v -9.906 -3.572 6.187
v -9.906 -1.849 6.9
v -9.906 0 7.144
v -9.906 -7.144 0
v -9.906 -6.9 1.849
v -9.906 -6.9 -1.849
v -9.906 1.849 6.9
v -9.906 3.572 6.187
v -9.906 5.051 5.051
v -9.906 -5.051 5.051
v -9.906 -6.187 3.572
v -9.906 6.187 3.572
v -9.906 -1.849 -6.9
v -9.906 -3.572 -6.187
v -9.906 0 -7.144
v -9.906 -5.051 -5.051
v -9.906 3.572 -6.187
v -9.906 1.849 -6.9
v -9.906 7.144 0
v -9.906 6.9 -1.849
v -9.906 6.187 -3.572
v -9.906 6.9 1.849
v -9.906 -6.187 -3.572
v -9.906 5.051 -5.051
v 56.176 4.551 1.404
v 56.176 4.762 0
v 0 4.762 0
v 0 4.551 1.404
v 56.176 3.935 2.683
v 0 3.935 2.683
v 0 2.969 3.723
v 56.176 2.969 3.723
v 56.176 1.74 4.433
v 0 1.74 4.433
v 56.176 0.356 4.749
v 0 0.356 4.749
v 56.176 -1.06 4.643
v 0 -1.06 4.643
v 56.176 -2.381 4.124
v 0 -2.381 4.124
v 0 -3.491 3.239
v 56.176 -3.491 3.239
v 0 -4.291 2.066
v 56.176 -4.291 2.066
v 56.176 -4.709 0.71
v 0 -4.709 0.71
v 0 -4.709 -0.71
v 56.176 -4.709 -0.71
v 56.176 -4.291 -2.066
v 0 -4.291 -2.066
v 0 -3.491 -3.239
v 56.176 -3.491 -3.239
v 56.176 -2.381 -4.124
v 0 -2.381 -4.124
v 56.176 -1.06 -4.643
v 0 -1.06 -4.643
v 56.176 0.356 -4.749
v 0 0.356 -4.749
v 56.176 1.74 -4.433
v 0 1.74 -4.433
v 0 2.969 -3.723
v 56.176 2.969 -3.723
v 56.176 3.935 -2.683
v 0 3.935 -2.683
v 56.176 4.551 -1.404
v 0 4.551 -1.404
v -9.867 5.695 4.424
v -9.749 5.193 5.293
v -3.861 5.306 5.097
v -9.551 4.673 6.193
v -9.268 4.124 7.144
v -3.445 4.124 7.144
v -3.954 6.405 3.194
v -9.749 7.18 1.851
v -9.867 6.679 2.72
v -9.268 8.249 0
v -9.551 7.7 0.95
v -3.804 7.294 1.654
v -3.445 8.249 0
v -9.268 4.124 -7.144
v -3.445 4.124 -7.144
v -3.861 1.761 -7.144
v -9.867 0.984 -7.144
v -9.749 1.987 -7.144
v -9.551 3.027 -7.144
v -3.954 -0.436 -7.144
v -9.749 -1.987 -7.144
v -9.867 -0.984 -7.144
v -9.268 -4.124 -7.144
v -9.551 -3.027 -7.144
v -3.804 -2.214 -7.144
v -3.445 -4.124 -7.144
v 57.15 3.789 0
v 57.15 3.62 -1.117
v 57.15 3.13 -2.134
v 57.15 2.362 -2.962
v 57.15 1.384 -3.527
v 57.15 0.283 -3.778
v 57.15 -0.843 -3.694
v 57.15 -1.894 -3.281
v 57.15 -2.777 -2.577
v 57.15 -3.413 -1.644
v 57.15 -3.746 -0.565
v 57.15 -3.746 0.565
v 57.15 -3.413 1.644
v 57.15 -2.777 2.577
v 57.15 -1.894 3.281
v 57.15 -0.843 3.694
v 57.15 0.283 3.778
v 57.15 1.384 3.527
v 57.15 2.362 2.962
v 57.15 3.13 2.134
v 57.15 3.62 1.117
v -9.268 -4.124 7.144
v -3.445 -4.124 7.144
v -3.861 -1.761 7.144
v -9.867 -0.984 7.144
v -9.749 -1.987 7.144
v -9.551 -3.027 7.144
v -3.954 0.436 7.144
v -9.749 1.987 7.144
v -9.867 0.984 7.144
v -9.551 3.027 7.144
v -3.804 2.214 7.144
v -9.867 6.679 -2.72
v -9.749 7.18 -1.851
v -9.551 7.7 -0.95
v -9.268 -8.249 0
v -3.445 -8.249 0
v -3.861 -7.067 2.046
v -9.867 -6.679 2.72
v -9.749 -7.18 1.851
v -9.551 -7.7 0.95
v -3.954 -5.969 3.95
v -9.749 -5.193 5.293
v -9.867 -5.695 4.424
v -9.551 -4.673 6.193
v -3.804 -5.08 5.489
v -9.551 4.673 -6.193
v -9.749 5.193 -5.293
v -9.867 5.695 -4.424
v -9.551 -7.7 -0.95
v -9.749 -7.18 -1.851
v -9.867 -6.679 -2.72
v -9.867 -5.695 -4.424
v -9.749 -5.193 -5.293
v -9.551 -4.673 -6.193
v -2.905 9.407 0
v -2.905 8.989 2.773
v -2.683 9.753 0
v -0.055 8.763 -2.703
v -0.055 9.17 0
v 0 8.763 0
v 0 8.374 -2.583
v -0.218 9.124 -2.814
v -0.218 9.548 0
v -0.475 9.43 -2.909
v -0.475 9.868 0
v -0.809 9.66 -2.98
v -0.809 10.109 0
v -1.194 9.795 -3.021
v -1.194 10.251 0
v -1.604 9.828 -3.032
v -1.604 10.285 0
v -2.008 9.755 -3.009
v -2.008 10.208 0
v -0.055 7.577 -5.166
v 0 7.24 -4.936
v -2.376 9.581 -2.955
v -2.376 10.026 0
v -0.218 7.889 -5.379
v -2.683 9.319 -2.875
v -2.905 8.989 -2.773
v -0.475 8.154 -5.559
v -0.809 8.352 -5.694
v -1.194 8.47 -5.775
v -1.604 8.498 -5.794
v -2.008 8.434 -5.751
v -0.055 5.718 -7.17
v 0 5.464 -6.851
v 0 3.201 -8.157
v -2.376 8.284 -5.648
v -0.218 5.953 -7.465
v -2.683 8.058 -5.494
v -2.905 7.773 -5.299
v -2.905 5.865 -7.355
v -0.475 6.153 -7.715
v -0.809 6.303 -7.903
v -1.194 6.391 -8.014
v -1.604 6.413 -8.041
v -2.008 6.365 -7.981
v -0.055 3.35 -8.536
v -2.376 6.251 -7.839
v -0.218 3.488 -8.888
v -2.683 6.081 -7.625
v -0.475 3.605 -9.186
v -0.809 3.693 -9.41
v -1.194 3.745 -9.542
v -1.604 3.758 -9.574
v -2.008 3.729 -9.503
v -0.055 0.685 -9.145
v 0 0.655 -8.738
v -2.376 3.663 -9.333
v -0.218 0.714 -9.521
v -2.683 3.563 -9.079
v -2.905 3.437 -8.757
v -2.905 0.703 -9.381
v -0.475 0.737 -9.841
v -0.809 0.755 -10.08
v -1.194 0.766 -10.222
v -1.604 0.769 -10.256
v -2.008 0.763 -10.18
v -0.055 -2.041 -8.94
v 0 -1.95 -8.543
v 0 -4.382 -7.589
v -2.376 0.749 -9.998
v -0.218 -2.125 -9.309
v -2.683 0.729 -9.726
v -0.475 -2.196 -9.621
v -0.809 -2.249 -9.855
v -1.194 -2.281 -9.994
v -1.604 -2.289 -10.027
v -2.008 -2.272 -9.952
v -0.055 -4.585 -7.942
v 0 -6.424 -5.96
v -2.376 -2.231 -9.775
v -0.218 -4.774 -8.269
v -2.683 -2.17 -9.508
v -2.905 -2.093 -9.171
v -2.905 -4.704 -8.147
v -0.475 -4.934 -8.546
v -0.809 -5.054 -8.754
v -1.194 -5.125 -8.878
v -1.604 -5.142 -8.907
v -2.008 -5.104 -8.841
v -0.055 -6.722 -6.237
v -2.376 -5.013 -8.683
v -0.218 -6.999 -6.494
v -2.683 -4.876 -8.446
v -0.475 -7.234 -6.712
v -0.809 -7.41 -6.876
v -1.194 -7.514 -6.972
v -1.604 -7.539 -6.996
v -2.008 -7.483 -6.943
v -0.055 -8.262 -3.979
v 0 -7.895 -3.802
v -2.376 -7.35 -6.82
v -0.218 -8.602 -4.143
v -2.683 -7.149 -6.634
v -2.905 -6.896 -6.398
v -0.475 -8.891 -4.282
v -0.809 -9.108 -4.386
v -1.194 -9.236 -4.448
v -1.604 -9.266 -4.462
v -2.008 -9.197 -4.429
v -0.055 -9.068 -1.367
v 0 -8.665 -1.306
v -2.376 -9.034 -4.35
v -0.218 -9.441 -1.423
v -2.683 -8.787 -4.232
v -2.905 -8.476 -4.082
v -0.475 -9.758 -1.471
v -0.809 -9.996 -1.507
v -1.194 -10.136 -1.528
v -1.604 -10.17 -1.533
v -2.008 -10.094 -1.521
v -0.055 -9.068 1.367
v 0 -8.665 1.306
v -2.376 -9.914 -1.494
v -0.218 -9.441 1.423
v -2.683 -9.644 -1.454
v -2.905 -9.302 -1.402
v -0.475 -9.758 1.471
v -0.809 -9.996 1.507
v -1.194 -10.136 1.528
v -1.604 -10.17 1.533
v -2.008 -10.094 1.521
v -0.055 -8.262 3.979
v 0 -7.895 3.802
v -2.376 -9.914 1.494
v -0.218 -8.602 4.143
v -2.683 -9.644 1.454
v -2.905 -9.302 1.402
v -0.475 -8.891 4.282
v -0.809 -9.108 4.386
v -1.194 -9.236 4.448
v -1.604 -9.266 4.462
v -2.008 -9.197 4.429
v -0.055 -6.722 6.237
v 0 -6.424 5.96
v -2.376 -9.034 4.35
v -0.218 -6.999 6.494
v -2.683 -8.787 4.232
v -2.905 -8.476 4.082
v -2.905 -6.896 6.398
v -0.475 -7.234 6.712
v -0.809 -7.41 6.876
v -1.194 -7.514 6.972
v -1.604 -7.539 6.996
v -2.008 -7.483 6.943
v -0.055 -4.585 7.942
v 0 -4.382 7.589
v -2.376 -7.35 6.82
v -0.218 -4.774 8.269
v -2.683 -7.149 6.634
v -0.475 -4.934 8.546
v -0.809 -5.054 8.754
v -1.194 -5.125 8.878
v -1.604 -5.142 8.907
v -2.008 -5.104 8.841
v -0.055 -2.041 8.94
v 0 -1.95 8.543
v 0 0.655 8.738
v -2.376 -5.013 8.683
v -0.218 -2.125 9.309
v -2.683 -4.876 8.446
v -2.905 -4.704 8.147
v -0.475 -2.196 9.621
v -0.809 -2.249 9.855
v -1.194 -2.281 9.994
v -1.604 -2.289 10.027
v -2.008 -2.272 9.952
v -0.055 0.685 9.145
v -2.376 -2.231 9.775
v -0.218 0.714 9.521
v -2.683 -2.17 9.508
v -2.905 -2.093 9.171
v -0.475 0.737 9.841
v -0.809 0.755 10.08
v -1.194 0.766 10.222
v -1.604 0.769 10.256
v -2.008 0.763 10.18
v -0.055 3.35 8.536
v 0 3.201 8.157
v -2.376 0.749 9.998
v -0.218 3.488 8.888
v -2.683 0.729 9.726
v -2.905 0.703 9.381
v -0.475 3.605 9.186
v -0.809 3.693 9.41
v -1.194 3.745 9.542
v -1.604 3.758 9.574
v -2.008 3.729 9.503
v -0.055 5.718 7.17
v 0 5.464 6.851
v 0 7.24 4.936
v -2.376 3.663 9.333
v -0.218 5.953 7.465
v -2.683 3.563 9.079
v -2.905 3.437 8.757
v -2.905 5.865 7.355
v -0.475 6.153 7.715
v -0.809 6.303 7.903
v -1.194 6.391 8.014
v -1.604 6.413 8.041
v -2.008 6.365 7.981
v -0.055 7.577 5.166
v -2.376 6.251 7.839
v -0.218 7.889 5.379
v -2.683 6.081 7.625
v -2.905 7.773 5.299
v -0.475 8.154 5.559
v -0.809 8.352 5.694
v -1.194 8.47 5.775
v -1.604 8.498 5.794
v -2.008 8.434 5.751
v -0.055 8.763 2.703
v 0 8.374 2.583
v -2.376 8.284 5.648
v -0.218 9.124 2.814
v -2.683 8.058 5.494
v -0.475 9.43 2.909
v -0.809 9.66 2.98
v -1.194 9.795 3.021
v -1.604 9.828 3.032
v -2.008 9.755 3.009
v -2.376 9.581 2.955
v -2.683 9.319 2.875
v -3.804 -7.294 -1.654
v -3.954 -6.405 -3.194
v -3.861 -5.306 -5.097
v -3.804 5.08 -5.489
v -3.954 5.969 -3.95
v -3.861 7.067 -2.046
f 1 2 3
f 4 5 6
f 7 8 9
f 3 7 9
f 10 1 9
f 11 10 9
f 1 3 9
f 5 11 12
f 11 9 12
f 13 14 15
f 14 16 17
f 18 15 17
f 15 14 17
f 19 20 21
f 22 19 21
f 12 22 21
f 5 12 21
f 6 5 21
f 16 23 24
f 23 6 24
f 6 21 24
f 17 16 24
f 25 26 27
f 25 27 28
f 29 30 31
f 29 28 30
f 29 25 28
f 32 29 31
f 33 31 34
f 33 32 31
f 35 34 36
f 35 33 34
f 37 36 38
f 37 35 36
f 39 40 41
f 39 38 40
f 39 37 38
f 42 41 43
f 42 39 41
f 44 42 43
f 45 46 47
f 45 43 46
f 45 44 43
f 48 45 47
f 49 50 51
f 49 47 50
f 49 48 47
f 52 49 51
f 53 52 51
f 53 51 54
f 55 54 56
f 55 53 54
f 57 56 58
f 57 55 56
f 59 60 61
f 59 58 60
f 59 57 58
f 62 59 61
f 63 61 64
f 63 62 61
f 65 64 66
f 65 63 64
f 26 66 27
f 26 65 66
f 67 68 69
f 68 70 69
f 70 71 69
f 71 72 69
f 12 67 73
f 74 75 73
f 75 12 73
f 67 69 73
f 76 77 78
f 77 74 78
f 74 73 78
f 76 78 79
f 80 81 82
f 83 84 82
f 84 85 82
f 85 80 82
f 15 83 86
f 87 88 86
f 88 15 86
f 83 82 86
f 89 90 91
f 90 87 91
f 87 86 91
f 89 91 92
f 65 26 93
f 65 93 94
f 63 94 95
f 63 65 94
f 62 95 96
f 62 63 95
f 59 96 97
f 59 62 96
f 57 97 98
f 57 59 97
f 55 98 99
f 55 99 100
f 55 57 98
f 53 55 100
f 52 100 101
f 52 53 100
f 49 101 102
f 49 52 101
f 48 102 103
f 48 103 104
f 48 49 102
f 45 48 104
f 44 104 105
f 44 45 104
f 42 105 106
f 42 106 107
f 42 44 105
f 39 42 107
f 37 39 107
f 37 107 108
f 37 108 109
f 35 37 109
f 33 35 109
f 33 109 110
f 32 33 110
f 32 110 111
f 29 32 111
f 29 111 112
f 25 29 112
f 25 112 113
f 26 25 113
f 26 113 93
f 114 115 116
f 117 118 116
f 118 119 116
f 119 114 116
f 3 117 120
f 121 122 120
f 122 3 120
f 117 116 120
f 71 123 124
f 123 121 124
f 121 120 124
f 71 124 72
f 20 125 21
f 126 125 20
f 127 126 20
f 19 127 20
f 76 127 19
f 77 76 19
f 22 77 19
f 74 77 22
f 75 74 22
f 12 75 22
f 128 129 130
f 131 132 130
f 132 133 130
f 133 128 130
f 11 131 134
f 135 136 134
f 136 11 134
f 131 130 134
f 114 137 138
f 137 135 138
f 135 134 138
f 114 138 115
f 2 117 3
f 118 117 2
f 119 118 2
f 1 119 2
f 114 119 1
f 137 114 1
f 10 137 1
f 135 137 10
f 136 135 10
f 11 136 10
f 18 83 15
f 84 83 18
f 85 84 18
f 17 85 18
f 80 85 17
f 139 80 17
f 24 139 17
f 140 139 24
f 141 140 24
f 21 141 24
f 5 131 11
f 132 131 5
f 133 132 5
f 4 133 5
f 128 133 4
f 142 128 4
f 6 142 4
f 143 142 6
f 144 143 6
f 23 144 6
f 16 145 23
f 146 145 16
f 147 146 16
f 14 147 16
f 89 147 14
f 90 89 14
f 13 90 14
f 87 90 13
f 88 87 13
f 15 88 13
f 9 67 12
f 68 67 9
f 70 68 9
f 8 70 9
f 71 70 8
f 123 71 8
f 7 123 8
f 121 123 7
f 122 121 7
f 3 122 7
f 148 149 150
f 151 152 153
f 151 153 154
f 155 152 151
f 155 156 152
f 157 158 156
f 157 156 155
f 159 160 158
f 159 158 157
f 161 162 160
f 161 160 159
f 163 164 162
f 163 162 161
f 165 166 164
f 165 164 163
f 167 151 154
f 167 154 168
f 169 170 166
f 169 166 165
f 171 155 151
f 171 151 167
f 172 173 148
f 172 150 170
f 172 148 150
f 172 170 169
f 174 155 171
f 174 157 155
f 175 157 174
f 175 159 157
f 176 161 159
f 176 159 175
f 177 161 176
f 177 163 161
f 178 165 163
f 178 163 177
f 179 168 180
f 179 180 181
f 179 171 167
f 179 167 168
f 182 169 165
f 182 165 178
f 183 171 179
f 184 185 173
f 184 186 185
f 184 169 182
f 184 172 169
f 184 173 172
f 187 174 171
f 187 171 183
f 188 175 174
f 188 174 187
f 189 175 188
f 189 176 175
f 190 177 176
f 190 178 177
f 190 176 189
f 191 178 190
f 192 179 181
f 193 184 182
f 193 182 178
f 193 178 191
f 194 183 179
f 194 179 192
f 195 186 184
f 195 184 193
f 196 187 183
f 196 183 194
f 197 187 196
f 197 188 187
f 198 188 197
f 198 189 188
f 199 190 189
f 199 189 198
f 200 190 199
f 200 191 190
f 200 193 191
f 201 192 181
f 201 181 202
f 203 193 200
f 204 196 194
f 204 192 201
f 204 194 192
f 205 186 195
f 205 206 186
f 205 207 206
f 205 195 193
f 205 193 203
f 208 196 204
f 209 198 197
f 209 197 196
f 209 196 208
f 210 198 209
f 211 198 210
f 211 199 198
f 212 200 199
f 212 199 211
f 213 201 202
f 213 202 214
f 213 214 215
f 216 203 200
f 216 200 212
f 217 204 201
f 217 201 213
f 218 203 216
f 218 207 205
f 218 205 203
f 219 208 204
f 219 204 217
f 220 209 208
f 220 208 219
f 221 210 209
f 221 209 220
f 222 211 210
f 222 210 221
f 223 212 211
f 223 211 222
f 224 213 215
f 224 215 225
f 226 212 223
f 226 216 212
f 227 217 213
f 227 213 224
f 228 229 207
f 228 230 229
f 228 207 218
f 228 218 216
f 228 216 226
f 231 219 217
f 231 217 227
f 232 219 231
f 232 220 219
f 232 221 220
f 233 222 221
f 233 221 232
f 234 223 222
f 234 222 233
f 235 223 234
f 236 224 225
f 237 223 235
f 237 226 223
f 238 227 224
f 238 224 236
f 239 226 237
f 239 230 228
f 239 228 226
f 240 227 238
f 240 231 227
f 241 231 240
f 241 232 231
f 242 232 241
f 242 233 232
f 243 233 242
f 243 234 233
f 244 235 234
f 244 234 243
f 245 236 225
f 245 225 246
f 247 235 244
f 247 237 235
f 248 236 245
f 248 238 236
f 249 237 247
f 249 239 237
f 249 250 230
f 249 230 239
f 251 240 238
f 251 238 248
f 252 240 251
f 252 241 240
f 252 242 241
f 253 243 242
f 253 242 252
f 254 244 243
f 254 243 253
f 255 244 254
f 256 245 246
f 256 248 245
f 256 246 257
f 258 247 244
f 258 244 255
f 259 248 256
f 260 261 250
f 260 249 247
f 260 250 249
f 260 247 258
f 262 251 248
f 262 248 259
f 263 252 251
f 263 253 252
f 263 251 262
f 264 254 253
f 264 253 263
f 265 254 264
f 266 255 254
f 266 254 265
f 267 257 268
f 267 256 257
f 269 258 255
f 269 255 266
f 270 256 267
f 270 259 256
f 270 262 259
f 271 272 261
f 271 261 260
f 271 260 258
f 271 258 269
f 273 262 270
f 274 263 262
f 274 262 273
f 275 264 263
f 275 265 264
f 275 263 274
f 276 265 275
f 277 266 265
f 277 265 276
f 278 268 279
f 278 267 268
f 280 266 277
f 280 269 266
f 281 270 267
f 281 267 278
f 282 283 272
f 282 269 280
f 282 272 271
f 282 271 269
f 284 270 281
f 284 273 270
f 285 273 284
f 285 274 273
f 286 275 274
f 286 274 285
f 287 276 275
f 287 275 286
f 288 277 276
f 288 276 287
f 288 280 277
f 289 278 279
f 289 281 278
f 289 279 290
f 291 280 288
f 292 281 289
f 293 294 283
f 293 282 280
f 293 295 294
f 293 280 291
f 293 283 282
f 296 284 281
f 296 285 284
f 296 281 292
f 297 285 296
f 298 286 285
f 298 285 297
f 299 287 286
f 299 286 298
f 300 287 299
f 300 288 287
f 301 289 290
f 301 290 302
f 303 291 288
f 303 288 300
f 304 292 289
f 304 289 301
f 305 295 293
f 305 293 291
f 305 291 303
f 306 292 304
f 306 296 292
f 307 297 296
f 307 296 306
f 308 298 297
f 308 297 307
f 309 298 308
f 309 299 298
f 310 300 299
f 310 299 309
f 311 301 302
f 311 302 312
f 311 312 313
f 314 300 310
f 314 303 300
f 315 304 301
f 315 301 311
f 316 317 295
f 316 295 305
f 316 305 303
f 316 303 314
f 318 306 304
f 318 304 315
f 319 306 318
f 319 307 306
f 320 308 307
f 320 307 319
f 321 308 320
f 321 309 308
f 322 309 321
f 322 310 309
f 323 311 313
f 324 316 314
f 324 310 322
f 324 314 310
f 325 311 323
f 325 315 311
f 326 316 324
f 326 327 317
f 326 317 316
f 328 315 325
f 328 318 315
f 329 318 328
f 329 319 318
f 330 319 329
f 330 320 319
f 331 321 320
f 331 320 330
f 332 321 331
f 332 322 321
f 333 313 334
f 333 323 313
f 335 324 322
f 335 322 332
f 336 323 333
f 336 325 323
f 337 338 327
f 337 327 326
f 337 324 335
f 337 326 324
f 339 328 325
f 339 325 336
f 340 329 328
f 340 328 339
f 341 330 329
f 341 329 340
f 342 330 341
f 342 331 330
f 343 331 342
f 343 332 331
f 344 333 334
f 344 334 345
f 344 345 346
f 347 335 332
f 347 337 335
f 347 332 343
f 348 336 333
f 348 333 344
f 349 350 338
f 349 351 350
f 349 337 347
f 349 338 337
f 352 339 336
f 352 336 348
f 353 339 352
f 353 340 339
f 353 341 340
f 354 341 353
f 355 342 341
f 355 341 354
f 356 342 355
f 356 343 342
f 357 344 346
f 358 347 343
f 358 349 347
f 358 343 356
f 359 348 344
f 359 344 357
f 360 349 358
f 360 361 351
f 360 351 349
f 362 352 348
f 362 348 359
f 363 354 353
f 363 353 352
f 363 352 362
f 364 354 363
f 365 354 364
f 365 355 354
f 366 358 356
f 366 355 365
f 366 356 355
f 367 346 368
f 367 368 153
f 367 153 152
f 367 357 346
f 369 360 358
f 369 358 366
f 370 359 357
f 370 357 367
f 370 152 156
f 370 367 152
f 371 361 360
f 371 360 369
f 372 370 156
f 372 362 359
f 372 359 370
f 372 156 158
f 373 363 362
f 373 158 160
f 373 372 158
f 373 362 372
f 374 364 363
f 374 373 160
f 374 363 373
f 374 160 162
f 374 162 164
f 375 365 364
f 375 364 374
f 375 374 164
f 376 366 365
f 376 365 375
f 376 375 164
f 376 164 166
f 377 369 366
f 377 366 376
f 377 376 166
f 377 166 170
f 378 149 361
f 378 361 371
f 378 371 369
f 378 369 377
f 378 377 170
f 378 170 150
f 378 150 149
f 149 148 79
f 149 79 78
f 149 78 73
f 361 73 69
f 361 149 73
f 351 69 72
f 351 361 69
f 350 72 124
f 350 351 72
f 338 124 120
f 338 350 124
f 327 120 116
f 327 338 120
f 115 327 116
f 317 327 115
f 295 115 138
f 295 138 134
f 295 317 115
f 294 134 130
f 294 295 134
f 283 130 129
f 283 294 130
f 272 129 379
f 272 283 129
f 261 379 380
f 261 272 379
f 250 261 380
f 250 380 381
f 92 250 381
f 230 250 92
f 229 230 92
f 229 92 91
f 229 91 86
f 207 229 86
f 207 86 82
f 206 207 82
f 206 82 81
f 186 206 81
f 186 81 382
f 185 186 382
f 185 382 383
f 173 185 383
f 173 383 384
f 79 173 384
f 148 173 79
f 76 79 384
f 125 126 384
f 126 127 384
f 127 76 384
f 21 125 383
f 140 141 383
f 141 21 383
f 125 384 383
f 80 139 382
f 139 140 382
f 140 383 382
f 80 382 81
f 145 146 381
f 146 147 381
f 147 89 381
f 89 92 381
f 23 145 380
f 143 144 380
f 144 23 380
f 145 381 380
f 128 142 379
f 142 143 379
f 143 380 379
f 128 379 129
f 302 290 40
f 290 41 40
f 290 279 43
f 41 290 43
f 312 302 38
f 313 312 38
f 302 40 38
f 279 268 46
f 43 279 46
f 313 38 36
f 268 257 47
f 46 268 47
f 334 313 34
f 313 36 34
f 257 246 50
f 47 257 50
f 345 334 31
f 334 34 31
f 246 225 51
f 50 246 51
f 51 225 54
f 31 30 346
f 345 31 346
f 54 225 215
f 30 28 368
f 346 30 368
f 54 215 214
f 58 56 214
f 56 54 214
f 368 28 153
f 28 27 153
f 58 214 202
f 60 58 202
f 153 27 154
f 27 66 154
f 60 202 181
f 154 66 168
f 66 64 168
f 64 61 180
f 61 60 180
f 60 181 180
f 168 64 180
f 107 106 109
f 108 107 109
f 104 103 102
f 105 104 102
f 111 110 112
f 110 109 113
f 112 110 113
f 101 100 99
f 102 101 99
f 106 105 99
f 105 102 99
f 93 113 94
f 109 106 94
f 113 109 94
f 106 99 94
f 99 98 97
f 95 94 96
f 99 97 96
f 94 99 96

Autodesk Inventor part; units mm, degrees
ref_plane "YZ Plane" through (0, 0, 0) normal (1, 0, 0) x (0, 1, 0)
ref_plane "XZ Plane" through (0, 0, 0) normal (0, 1, 0) x (-1, 0, 0)
sketch "Sketch1" plane through (0, 0, 0) normal (0, 0, 1) x (1, 0, 0)
  line L0 (-4.4577, 0) -> (-4.4577, 6.0778)
  line L1 (0, 8.763) -> (0, 4.7625)
  line L2 (31.75, 4.7625) -> (57.15, 4.7625)
  line L3 (57.15, 4.7625) -> (57.15, 0)
  line L4 (57.15, 0) -> (-4.4577, 0)
  arc A0 (0, 8.763) -> (-2.9052, 9.4071) centre (-1.524, 8.763) ccw
  line L5 (0, -2.1146) -> (0, 12.6875) projected
  line L6 (-16.7792, 0) -> (69.4715, 0) projected
  line L7 (0, 4.7625) -> (0.0001, 4.7625)
  line L8 (0.0001, 4.7625) -> (0.0001, 4.7625)
  line L9 (0.0001, 4.7625) -> (20.6248, 4.7625)
  line L10 (20.6248, 4.7625) -> (31.75, 4.7625)
  line L11 (-4.4577, 6.0778) -> (-2.9052, 9.4071)
  line L12 (0.0001, 4.7625) -> (31.75, 4.7625) construction
  line L13 (31.75, 4.7625) -> (31.75, 0) construction
  dimension "d0" = 1.524
  dimension "d1" = 57.15
  dimension "d2" = 25.4
  dimension "d3" = 20.574
  dimension "d4" = 9.525
  dimension "d5" = 4.4577
  dimension "d15" = 9.525
  dimension "d16" = 9.525
  dimension "d17" = 0.0001
  dimension "d18" = 11.1252
  dimension "d19" = 25
revolve "Body" add sketch "Sketch1" angle 360 about axis through (57.15, 0, 0) along (-1, 0, 0)
sketch "Sketch2" plane through (0, 0, 0) normal (1, 0, 0) x (0, 0, -1)
  line L0 (7.1438, 4.1244) -> (7.1437, -4.1244)
  line L1 (7.1437, -4.1244) -> (0, -8.2489)
  line L2 (0, -8.2489) -> (-7.1438, -4.1244)
  line L3 (-7.1438, -4.1244) -> (-7.1437, 4.1244)
  line L4 (-7.1437, 4.1244) -> (0, 8.2489)
  line L5 (0, 8.2489) -> (7.1438, 4.1244)
  point P0 (0, 0)
  point P1 (0, 0)
  dimension "d23" = 14.2875
extrude "Head" add sketch "Sketch2" against normal blind 9.906
sketch "Sketch3" plane through (0, 0, 0) normal (0, 0, 1) x (1, 0, 0)
  line L0 (-9.906, 7.1437) -> (-9.906, 8.2489)
  line L1 (-9.906, 8.2489) -> (-9.2679, 8.2489)
  line L2 (-9.2679, 8.2489) -> (-9.906, 7.1437)
  line L3 (-11.1981, 0) -> (-2.1531, 0) projected
  line L4 (-9.906, 8.2489) -> (-9.906, 4.1244) projected
  line L5 (-3.4453, 8.2489) -> (-9.906, 8.2489) projected
  point P0 (-9.906, 4.1244)
  dimension "d8" = 30
  dimension "d22" = 14.2875
revolve "Chamfer1" cut sketch "Sketch3" angle 360 about axis through (-10, 0, 0) along (1, 0, 0)
thread "Thread" size "3/8-16 UNC" class "2A" standard "ANSI Unified Screw Threads" length 25.4
chamfer "Chamfer2" distance 0.9739 distance2 0.9739 1 edges at (57.15, -4.7625, 0) measured on face at (57.15, 0.5629, 1.4843)
ref_plane "Work Plane1" through (10.95, 0, 0) normal (0, 0, -1) x (1, 0, 0)
equation "\"d23\" = SW"
equation "\"d6\" = KOH"
equation "\"d10\" = GEL"
equation "\"d13\" = -0.5 * SPD + 0.5 * GD"
equation "\"d14\" = GUL"
equation "\"d0\" = PHH"
equation "\"d1\" = NLG"
equation "\"d2\" = GEL"
equation "\"d3\" = LADI"
equation "\"d4\" = GD"
equation "\"d5\" = 0.45 * KOH"
equation "\"d15\" = SD2"
equation "\"d16\" = BDM"
equation "\"d18\" = GAL"
equation "\"d19\" = KEWI"
equation "\"d8\" = ANG1"
equation "\"d22\" = SW0"
equation "\"NLG\" = 57.15"
equation "\"GD\" = NND"
equation "\"BDM\" = NND"
equation "\"KOH\" = 9.906"
equation "\"GEL\" = 25.4"
equation "\"LADI\" = 20.574"
equation "\"SW\" = 14.2875"
equation "\"PHH\" = 1.524"
equation "\"SW0\" = SW"
equation "\"SPD\" = 7.5773"
equation "\"SD2\" = NND"
equation "\"SD\" = 0"
equation "\"ANG1\" = 30deg"
equation "\"KEWI\" = 25deg"
equation "\"GAL\" = 11.1252"
equation "\"GUL\" = 0.97385"
equation "\"THREADDIA\" = 9.525"
equation "\"SDH\" = SW"
equation "\"TOA\" = 30deg"
equation "\"NND\" = 9.525"
equation "\"E0\" = 1.155 * SW"
equation "\"GD1\" = 7.5773"
properties part number "92979A186" material "Steel, Mild"
